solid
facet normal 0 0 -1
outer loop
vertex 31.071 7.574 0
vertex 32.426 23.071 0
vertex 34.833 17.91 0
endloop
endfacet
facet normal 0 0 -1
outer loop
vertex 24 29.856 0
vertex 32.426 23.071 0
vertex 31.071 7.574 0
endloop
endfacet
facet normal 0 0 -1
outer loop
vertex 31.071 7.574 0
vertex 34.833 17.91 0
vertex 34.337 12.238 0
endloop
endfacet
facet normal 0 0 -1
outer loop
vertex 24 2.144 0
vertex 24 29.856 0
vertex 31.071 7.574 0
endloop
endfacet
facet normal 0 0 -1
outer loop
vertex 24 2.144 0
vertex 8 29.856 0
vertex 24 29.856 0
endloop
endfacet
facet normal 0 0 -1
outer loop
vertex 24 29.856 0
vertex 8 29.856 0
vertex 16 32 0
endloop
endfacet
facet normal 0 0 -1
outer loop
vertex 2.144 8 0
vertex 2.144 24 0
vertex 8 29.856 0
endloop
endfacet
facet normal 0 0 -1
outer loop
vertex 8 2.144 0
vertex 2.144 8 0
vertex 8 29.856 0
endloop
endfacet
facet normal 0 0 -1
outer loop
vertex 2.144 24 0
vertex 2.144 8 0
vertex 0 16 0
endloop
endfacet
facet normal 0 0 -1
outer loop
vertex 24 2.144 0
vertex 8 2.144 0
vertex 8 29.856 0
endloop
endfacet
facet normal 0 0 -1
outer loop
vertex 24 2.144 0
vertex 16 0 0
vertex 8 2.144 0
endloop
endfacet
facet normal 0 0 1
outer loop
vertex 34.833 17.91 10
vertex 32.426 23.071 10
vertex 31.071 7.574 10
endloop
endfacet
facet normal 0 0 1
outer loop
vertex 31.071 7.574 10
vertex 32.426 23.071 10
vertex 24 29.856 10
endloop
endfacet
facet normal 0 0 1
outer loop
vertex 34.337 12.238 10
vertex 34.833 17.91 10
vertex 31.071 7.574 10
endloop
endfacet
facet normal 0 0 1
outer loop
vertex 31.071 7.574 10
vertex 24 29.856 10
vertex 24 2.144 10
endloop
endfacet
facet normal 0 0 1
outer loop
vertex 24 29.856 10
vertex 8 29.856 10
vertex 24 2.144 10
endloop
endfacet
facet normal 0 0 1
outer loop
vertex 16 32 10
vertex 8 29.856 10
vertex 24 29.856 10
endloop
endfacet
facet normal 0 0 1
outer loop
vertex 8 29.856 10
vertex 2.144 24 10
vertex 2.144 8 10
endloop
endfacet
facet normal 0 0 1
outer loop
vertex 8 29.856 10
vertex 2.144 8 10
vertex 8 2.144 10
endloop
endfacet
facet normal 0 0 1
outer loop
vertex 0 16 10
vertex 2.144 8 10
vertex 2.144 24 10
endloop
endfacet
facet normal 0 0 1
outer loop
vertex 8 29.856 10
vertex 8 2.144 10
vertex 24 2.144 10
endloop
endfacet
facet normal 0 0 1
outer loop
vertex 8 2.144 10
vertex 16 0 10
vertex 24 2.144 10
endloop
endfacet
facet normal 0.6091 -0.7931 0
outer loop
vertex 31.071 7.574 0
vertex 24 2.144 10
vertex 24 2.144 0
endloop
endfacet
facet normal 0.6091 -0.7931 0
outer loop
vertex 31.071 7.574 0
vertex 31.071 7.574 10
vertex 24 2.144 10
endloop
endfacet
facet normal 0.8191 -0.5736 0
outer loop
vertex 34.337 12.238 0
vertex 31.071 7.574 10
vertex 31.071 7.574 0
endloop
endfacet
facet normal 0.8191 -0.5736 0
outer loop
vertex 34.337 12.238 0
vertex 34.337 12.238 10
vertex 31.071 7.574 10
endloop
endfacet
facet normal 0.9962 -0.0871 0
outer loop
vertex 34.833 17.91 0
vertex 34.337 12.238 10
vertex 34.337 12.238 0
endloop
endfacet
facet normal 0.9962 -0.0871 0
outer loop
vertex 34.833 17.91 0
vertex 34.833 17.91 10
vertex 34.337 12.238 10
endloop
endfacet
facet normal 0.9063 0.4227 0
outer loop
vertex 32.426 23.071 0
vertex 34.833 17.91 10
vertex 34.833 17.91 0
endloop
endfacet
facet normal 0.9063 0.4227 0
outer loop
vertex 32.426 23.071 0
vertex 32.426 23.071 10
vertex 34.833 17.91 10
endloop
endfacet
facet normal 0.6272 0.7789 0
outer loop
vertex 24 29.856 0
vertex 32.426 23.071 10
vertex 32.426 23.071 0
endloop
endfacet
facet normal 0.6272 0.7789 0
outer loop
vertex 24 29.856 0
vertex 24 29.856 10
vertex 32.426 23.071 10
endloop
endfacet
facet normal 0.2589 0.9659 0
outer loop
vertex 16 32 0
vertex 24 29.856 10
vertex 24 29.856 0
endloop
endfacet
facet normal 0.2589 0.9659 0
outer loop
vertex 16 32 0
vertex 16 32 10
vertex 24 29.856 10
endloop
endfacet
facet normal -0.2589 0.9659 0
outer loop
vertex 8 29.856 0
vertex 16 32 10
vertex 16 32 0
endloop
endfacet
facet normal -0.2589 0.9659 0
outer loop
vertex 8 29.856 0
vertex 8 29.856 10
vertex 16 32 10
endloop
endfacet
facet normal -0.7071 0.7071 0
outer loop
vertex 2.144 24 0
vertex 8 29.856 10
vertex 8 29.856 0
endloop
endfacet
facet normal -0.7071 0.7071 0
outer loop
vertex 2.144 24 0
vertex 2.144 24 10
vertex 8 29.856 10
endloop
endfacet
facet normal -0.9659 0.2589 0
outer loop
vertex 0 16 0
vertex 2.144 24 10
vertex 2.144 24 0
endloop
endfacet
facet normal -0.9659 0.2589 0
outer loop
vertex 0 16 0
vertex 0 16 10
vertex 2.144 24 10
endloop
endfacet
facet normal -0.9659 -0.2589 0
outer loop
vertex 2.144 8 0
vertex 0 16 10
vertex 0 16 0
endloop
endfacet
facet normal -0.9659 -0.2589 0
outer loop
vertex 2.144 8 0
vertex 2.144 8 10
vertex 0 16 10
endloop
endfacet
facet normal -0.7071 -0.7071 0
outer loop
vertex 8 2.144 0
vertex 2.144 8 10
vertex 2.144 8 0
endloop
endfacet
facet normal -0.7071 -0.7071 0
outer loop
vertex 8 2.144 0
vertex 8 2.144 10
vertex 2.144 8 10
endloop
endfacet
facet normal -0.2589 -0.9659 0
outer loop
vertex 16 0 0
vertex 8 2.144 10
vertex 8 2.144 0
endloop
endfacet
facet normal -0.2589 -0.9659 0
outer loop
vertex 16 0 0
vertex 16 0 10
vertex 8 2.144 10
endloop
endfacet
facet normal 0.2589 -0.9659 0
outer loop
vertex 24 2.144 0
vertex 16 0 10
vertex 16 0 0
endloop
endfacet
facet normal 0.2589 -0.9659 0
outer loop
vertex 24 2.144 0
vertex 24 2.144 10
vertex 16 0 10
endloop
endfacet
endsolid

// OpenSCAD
$fn = 32;

// ----------------------------------------------------------------------
// Eccentric disc: egg, 10 mm thick
// ----------------------------------------------------------------------

// --- parameters (mm) ---
profile_height = 10;      // extrusion height
profile_points = 13;      // points of the closed outline

profile = [[0, 16], [2.144, 8], [8, 2.144], [16, 0], [24, 2.144], [31.071, 7.574], [34.337, 12.238], [34.833, 17.91], [32.426, 23.071], [24, 29.856], [16, 32], [8, 29.856], [2.144, 24]];  // single closed polygon, 13 points, counter clockwise

// --- the one profile operation ---
linear_extrude(height = profile_height) polygon(points = profile);
